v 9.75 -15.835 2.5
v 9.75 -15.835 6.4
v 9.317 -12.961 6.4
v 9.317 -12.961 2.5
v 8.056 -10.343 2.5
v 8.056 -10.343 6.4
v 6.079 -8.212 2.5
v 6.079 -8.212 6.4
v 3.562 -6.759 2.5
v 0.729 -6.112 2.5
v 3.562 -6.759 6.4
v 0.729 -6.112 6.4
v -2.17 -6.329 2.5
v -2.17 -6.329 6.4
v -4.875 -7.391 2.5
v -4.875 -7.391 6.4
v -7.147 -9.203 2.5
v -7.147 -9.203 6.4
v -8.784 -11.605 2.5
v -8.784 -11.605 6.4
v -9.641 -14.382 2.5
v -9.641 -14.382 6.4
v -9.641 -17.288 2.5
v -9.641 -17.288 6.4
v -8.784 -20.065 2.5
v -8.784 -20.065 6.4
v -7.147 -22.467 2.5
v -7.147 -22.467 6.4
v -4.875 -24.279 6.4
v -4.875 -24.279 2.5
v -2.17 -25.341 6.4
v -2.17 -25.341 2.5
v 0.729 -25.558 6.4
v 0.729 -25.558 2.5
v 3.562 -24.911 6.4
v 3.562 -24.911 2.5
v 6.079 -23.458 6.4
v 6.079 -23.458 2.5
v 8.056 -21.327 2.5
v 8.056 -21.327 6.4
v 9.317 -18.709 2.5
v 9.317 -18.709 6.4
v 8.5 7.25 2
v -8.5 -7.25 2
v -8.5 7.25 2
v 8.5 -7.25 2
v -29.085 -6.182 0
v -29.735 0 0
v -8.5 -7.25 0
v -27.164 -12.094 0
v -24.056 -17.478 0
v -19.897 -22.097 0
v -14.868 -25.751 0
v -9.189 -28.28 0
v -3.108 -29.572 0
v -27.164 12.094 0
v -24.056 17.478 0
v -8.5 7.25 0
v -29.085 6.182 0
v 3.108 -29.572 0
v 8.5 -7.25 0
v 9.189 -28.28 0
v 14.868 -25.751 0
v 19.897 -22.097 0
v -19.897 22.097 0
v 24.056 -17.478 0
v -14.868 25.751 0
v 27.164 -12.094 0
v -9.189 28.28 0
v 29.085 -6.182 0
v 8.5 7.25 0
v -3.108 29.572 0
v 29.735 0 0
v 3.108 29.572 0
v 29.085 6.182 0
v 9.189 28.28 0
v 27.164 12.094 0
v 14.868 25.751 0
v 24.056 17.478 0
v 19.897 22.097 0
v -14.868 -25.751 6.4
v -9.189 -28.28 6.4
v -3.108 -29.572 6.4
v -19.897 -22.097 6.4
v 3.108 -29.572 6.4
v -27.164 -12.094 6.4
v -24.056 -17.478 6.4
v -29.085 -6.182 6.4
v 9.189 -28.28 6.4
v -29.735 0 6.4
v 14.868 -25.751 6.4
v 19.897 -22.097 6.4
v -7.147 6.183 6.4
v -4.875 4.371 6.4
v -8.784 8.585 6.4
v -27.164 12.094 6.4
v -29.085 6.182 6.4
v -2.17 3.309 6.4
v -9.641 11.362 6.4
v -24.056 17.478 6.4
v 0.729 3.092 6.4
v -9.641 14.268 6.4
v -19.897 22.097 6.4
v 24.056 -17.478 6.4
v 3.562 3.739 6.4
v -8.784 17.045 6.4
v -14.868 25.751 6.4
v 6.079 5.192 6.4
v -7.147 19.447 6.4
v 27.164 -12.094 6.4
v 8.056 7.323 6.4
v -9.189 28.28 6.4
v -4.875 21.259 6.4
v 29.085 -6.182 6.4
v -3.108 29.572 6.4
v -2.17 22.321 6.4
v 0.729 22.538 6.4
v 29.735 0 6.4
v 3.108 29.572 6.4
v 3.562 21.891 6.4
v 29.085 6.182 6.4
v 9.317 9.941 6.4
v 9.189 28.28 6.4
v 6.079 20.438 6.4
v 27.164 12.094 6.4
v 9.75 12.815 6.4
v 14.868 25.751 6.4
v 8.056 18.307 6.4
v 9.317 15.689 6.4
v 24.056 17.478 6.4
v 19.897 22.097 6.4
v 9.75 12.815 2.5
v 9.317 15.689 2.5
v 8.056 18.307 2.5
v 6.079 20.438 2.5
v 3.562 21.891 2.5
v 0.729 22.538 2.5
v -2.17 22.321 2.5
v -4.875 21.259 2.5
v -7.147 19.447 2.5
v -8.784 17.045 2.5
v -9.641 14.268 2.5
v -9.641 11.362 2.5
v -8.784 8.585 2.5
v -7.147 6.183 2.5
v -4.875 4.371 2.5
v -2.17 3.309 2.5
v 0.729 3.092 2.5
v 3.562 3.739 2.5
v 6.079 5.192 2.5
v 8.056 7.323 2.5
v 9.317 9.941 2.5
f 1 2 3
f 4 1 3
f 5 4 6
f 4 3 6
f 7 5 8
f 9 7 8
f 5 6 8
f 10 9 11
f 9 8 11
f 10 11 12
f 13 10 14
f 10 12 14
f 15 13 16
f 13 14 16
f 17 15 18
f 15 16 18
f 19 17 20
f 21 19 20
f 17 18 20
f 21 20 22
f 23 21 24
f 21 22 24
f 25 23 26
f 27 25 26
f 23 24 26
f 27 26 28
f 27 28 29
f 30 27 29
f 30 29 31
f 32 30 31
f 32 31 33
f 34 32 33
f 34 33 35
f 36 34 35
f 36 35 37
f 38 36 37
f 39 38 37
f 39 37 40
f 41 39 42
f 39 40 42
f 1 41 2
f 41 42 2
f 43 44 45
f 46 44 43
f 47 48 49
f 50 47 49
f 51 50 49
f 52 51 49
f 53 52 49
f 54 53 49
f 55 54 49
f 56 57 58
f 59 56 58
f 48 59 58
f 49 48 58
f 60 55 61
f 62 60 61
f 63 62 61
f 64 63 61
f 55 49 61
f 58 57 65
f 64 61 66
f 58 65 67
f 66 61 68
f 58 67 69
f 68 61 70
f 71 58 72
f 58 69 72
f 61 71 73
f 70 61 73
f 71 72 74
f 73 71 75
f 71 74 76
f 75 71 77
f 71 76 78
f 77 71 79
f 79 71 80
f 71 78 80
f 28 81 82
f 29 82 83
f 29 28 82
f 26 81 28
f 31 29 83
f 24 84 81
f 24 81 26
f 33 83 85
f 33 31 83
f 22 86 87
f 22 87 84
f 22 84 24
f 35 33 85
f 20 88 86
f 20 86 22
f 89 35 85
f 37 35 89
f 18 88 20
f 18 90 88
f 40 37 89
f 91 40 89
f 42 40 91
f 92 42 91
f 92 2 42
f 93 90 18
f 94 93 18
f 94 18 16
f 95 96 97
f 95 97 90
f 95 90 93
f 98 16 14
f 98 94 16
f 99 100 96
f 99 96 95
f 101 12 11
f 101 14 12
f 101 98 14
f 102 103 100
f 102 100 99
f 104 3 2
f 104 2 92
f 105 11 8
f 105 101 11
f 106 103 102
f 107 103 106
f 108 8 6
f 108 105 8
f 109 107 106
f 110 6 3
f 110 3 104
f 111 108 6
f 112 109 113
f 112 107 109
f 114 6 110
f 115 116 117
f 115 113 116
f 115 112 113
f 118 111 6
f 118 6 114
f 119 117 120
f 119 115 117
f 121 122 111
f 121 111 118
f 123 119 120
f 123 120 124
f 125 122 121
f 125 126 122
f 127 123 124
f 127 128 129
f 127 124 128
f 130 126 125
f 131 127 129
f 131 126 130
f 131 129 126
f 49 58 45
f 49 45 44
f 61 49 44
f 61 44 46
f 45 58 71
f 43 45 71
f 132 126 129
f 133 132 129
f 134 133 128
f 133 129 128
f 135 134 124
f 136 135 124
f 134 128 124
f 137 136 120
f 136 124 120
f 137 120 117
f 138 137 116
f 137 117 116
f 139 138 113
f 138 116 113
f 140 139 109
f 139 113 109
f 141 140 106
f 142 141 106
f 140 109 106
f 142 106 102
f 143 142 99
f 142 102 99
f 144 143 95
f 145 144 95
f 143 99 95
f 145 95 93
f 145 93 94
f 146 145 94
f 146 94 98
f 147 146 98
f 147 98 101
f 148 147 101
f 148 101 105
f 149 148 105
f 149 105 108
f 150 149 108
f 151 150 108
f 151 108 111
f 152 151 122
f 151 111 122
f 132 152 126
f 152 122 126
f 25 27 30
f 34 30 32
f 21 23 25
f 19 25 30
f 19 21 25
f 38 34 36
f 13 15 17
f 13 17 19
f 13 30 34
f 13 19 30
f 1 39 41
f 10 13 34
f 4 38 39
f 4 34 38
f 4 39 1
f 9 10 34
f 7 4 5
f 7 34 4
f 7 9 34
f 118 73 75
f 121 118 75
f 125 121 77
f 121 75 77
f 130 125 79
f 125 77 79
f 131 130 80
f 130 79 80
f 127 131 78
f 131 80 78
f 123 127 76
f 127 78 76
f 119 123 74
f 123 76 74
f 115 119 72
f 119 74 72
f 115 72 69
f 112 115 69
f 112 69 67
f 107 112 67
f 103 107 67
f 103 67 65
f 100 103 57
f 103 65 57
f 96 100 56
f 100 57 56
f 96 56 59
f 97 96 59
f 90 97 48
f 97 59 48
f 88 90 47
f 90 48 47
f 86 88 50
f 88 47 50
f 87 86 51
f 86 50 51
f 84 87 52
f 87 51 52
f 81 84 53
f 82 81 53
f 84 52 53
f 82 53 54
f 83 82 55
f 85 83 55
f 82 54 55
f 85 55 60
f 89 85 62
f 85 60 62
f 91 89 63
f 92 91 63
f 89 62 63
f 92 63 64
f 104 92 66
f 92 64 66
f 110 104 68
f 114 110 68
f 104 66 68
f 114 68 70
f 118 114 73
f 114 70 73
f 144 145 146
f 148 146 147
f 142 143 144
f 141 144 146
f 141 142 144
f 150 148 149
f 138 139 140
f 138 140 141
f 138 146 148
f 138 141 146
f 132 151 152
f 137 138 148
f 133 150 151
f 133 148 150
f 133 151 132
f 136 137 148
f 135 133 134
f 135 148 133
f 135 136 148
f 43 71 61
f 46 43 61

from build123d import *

# Parameters (mm, degrees)
F0_R     = 29.735
F1_DEPTH = 6.4
F2_R     = 9.75
F3_DEPTH = 3.9
F4_W     = 17
F4_H     = 14.5
F5_DEPTH = 2


with BuildPart() as f1:
    # F0 (on Top) → F1 (new body)
    with BuildSketch(Plane.XY):
        Circle(F0_R)
    extrude(amount=F1_DEPTH)

    # F2 (on face) → F3 (cut)
    with BuildSketch(Plane.XY.offset(6.4)):
        with Locations((0, 12.815)):
            Circle(F2_R)
        with Locations((0, -15.835)):
            Circle(F2_R)
    extrude(amount=-F3_DEPTH, mode=Mode.SUBTRACT)

    # F4 (on face) → F5 (cut)
    with BuildSketch(Plane(origin=(0, 0, 0), x_dir=(1, 0, 0), z_dir=(0, 0, -1))):
        Rectangle(F4_W, F4_H)
    extrude(amount=-F5_DEPTH, mode=Mode.SUBTRACT)


solid = f1.part
